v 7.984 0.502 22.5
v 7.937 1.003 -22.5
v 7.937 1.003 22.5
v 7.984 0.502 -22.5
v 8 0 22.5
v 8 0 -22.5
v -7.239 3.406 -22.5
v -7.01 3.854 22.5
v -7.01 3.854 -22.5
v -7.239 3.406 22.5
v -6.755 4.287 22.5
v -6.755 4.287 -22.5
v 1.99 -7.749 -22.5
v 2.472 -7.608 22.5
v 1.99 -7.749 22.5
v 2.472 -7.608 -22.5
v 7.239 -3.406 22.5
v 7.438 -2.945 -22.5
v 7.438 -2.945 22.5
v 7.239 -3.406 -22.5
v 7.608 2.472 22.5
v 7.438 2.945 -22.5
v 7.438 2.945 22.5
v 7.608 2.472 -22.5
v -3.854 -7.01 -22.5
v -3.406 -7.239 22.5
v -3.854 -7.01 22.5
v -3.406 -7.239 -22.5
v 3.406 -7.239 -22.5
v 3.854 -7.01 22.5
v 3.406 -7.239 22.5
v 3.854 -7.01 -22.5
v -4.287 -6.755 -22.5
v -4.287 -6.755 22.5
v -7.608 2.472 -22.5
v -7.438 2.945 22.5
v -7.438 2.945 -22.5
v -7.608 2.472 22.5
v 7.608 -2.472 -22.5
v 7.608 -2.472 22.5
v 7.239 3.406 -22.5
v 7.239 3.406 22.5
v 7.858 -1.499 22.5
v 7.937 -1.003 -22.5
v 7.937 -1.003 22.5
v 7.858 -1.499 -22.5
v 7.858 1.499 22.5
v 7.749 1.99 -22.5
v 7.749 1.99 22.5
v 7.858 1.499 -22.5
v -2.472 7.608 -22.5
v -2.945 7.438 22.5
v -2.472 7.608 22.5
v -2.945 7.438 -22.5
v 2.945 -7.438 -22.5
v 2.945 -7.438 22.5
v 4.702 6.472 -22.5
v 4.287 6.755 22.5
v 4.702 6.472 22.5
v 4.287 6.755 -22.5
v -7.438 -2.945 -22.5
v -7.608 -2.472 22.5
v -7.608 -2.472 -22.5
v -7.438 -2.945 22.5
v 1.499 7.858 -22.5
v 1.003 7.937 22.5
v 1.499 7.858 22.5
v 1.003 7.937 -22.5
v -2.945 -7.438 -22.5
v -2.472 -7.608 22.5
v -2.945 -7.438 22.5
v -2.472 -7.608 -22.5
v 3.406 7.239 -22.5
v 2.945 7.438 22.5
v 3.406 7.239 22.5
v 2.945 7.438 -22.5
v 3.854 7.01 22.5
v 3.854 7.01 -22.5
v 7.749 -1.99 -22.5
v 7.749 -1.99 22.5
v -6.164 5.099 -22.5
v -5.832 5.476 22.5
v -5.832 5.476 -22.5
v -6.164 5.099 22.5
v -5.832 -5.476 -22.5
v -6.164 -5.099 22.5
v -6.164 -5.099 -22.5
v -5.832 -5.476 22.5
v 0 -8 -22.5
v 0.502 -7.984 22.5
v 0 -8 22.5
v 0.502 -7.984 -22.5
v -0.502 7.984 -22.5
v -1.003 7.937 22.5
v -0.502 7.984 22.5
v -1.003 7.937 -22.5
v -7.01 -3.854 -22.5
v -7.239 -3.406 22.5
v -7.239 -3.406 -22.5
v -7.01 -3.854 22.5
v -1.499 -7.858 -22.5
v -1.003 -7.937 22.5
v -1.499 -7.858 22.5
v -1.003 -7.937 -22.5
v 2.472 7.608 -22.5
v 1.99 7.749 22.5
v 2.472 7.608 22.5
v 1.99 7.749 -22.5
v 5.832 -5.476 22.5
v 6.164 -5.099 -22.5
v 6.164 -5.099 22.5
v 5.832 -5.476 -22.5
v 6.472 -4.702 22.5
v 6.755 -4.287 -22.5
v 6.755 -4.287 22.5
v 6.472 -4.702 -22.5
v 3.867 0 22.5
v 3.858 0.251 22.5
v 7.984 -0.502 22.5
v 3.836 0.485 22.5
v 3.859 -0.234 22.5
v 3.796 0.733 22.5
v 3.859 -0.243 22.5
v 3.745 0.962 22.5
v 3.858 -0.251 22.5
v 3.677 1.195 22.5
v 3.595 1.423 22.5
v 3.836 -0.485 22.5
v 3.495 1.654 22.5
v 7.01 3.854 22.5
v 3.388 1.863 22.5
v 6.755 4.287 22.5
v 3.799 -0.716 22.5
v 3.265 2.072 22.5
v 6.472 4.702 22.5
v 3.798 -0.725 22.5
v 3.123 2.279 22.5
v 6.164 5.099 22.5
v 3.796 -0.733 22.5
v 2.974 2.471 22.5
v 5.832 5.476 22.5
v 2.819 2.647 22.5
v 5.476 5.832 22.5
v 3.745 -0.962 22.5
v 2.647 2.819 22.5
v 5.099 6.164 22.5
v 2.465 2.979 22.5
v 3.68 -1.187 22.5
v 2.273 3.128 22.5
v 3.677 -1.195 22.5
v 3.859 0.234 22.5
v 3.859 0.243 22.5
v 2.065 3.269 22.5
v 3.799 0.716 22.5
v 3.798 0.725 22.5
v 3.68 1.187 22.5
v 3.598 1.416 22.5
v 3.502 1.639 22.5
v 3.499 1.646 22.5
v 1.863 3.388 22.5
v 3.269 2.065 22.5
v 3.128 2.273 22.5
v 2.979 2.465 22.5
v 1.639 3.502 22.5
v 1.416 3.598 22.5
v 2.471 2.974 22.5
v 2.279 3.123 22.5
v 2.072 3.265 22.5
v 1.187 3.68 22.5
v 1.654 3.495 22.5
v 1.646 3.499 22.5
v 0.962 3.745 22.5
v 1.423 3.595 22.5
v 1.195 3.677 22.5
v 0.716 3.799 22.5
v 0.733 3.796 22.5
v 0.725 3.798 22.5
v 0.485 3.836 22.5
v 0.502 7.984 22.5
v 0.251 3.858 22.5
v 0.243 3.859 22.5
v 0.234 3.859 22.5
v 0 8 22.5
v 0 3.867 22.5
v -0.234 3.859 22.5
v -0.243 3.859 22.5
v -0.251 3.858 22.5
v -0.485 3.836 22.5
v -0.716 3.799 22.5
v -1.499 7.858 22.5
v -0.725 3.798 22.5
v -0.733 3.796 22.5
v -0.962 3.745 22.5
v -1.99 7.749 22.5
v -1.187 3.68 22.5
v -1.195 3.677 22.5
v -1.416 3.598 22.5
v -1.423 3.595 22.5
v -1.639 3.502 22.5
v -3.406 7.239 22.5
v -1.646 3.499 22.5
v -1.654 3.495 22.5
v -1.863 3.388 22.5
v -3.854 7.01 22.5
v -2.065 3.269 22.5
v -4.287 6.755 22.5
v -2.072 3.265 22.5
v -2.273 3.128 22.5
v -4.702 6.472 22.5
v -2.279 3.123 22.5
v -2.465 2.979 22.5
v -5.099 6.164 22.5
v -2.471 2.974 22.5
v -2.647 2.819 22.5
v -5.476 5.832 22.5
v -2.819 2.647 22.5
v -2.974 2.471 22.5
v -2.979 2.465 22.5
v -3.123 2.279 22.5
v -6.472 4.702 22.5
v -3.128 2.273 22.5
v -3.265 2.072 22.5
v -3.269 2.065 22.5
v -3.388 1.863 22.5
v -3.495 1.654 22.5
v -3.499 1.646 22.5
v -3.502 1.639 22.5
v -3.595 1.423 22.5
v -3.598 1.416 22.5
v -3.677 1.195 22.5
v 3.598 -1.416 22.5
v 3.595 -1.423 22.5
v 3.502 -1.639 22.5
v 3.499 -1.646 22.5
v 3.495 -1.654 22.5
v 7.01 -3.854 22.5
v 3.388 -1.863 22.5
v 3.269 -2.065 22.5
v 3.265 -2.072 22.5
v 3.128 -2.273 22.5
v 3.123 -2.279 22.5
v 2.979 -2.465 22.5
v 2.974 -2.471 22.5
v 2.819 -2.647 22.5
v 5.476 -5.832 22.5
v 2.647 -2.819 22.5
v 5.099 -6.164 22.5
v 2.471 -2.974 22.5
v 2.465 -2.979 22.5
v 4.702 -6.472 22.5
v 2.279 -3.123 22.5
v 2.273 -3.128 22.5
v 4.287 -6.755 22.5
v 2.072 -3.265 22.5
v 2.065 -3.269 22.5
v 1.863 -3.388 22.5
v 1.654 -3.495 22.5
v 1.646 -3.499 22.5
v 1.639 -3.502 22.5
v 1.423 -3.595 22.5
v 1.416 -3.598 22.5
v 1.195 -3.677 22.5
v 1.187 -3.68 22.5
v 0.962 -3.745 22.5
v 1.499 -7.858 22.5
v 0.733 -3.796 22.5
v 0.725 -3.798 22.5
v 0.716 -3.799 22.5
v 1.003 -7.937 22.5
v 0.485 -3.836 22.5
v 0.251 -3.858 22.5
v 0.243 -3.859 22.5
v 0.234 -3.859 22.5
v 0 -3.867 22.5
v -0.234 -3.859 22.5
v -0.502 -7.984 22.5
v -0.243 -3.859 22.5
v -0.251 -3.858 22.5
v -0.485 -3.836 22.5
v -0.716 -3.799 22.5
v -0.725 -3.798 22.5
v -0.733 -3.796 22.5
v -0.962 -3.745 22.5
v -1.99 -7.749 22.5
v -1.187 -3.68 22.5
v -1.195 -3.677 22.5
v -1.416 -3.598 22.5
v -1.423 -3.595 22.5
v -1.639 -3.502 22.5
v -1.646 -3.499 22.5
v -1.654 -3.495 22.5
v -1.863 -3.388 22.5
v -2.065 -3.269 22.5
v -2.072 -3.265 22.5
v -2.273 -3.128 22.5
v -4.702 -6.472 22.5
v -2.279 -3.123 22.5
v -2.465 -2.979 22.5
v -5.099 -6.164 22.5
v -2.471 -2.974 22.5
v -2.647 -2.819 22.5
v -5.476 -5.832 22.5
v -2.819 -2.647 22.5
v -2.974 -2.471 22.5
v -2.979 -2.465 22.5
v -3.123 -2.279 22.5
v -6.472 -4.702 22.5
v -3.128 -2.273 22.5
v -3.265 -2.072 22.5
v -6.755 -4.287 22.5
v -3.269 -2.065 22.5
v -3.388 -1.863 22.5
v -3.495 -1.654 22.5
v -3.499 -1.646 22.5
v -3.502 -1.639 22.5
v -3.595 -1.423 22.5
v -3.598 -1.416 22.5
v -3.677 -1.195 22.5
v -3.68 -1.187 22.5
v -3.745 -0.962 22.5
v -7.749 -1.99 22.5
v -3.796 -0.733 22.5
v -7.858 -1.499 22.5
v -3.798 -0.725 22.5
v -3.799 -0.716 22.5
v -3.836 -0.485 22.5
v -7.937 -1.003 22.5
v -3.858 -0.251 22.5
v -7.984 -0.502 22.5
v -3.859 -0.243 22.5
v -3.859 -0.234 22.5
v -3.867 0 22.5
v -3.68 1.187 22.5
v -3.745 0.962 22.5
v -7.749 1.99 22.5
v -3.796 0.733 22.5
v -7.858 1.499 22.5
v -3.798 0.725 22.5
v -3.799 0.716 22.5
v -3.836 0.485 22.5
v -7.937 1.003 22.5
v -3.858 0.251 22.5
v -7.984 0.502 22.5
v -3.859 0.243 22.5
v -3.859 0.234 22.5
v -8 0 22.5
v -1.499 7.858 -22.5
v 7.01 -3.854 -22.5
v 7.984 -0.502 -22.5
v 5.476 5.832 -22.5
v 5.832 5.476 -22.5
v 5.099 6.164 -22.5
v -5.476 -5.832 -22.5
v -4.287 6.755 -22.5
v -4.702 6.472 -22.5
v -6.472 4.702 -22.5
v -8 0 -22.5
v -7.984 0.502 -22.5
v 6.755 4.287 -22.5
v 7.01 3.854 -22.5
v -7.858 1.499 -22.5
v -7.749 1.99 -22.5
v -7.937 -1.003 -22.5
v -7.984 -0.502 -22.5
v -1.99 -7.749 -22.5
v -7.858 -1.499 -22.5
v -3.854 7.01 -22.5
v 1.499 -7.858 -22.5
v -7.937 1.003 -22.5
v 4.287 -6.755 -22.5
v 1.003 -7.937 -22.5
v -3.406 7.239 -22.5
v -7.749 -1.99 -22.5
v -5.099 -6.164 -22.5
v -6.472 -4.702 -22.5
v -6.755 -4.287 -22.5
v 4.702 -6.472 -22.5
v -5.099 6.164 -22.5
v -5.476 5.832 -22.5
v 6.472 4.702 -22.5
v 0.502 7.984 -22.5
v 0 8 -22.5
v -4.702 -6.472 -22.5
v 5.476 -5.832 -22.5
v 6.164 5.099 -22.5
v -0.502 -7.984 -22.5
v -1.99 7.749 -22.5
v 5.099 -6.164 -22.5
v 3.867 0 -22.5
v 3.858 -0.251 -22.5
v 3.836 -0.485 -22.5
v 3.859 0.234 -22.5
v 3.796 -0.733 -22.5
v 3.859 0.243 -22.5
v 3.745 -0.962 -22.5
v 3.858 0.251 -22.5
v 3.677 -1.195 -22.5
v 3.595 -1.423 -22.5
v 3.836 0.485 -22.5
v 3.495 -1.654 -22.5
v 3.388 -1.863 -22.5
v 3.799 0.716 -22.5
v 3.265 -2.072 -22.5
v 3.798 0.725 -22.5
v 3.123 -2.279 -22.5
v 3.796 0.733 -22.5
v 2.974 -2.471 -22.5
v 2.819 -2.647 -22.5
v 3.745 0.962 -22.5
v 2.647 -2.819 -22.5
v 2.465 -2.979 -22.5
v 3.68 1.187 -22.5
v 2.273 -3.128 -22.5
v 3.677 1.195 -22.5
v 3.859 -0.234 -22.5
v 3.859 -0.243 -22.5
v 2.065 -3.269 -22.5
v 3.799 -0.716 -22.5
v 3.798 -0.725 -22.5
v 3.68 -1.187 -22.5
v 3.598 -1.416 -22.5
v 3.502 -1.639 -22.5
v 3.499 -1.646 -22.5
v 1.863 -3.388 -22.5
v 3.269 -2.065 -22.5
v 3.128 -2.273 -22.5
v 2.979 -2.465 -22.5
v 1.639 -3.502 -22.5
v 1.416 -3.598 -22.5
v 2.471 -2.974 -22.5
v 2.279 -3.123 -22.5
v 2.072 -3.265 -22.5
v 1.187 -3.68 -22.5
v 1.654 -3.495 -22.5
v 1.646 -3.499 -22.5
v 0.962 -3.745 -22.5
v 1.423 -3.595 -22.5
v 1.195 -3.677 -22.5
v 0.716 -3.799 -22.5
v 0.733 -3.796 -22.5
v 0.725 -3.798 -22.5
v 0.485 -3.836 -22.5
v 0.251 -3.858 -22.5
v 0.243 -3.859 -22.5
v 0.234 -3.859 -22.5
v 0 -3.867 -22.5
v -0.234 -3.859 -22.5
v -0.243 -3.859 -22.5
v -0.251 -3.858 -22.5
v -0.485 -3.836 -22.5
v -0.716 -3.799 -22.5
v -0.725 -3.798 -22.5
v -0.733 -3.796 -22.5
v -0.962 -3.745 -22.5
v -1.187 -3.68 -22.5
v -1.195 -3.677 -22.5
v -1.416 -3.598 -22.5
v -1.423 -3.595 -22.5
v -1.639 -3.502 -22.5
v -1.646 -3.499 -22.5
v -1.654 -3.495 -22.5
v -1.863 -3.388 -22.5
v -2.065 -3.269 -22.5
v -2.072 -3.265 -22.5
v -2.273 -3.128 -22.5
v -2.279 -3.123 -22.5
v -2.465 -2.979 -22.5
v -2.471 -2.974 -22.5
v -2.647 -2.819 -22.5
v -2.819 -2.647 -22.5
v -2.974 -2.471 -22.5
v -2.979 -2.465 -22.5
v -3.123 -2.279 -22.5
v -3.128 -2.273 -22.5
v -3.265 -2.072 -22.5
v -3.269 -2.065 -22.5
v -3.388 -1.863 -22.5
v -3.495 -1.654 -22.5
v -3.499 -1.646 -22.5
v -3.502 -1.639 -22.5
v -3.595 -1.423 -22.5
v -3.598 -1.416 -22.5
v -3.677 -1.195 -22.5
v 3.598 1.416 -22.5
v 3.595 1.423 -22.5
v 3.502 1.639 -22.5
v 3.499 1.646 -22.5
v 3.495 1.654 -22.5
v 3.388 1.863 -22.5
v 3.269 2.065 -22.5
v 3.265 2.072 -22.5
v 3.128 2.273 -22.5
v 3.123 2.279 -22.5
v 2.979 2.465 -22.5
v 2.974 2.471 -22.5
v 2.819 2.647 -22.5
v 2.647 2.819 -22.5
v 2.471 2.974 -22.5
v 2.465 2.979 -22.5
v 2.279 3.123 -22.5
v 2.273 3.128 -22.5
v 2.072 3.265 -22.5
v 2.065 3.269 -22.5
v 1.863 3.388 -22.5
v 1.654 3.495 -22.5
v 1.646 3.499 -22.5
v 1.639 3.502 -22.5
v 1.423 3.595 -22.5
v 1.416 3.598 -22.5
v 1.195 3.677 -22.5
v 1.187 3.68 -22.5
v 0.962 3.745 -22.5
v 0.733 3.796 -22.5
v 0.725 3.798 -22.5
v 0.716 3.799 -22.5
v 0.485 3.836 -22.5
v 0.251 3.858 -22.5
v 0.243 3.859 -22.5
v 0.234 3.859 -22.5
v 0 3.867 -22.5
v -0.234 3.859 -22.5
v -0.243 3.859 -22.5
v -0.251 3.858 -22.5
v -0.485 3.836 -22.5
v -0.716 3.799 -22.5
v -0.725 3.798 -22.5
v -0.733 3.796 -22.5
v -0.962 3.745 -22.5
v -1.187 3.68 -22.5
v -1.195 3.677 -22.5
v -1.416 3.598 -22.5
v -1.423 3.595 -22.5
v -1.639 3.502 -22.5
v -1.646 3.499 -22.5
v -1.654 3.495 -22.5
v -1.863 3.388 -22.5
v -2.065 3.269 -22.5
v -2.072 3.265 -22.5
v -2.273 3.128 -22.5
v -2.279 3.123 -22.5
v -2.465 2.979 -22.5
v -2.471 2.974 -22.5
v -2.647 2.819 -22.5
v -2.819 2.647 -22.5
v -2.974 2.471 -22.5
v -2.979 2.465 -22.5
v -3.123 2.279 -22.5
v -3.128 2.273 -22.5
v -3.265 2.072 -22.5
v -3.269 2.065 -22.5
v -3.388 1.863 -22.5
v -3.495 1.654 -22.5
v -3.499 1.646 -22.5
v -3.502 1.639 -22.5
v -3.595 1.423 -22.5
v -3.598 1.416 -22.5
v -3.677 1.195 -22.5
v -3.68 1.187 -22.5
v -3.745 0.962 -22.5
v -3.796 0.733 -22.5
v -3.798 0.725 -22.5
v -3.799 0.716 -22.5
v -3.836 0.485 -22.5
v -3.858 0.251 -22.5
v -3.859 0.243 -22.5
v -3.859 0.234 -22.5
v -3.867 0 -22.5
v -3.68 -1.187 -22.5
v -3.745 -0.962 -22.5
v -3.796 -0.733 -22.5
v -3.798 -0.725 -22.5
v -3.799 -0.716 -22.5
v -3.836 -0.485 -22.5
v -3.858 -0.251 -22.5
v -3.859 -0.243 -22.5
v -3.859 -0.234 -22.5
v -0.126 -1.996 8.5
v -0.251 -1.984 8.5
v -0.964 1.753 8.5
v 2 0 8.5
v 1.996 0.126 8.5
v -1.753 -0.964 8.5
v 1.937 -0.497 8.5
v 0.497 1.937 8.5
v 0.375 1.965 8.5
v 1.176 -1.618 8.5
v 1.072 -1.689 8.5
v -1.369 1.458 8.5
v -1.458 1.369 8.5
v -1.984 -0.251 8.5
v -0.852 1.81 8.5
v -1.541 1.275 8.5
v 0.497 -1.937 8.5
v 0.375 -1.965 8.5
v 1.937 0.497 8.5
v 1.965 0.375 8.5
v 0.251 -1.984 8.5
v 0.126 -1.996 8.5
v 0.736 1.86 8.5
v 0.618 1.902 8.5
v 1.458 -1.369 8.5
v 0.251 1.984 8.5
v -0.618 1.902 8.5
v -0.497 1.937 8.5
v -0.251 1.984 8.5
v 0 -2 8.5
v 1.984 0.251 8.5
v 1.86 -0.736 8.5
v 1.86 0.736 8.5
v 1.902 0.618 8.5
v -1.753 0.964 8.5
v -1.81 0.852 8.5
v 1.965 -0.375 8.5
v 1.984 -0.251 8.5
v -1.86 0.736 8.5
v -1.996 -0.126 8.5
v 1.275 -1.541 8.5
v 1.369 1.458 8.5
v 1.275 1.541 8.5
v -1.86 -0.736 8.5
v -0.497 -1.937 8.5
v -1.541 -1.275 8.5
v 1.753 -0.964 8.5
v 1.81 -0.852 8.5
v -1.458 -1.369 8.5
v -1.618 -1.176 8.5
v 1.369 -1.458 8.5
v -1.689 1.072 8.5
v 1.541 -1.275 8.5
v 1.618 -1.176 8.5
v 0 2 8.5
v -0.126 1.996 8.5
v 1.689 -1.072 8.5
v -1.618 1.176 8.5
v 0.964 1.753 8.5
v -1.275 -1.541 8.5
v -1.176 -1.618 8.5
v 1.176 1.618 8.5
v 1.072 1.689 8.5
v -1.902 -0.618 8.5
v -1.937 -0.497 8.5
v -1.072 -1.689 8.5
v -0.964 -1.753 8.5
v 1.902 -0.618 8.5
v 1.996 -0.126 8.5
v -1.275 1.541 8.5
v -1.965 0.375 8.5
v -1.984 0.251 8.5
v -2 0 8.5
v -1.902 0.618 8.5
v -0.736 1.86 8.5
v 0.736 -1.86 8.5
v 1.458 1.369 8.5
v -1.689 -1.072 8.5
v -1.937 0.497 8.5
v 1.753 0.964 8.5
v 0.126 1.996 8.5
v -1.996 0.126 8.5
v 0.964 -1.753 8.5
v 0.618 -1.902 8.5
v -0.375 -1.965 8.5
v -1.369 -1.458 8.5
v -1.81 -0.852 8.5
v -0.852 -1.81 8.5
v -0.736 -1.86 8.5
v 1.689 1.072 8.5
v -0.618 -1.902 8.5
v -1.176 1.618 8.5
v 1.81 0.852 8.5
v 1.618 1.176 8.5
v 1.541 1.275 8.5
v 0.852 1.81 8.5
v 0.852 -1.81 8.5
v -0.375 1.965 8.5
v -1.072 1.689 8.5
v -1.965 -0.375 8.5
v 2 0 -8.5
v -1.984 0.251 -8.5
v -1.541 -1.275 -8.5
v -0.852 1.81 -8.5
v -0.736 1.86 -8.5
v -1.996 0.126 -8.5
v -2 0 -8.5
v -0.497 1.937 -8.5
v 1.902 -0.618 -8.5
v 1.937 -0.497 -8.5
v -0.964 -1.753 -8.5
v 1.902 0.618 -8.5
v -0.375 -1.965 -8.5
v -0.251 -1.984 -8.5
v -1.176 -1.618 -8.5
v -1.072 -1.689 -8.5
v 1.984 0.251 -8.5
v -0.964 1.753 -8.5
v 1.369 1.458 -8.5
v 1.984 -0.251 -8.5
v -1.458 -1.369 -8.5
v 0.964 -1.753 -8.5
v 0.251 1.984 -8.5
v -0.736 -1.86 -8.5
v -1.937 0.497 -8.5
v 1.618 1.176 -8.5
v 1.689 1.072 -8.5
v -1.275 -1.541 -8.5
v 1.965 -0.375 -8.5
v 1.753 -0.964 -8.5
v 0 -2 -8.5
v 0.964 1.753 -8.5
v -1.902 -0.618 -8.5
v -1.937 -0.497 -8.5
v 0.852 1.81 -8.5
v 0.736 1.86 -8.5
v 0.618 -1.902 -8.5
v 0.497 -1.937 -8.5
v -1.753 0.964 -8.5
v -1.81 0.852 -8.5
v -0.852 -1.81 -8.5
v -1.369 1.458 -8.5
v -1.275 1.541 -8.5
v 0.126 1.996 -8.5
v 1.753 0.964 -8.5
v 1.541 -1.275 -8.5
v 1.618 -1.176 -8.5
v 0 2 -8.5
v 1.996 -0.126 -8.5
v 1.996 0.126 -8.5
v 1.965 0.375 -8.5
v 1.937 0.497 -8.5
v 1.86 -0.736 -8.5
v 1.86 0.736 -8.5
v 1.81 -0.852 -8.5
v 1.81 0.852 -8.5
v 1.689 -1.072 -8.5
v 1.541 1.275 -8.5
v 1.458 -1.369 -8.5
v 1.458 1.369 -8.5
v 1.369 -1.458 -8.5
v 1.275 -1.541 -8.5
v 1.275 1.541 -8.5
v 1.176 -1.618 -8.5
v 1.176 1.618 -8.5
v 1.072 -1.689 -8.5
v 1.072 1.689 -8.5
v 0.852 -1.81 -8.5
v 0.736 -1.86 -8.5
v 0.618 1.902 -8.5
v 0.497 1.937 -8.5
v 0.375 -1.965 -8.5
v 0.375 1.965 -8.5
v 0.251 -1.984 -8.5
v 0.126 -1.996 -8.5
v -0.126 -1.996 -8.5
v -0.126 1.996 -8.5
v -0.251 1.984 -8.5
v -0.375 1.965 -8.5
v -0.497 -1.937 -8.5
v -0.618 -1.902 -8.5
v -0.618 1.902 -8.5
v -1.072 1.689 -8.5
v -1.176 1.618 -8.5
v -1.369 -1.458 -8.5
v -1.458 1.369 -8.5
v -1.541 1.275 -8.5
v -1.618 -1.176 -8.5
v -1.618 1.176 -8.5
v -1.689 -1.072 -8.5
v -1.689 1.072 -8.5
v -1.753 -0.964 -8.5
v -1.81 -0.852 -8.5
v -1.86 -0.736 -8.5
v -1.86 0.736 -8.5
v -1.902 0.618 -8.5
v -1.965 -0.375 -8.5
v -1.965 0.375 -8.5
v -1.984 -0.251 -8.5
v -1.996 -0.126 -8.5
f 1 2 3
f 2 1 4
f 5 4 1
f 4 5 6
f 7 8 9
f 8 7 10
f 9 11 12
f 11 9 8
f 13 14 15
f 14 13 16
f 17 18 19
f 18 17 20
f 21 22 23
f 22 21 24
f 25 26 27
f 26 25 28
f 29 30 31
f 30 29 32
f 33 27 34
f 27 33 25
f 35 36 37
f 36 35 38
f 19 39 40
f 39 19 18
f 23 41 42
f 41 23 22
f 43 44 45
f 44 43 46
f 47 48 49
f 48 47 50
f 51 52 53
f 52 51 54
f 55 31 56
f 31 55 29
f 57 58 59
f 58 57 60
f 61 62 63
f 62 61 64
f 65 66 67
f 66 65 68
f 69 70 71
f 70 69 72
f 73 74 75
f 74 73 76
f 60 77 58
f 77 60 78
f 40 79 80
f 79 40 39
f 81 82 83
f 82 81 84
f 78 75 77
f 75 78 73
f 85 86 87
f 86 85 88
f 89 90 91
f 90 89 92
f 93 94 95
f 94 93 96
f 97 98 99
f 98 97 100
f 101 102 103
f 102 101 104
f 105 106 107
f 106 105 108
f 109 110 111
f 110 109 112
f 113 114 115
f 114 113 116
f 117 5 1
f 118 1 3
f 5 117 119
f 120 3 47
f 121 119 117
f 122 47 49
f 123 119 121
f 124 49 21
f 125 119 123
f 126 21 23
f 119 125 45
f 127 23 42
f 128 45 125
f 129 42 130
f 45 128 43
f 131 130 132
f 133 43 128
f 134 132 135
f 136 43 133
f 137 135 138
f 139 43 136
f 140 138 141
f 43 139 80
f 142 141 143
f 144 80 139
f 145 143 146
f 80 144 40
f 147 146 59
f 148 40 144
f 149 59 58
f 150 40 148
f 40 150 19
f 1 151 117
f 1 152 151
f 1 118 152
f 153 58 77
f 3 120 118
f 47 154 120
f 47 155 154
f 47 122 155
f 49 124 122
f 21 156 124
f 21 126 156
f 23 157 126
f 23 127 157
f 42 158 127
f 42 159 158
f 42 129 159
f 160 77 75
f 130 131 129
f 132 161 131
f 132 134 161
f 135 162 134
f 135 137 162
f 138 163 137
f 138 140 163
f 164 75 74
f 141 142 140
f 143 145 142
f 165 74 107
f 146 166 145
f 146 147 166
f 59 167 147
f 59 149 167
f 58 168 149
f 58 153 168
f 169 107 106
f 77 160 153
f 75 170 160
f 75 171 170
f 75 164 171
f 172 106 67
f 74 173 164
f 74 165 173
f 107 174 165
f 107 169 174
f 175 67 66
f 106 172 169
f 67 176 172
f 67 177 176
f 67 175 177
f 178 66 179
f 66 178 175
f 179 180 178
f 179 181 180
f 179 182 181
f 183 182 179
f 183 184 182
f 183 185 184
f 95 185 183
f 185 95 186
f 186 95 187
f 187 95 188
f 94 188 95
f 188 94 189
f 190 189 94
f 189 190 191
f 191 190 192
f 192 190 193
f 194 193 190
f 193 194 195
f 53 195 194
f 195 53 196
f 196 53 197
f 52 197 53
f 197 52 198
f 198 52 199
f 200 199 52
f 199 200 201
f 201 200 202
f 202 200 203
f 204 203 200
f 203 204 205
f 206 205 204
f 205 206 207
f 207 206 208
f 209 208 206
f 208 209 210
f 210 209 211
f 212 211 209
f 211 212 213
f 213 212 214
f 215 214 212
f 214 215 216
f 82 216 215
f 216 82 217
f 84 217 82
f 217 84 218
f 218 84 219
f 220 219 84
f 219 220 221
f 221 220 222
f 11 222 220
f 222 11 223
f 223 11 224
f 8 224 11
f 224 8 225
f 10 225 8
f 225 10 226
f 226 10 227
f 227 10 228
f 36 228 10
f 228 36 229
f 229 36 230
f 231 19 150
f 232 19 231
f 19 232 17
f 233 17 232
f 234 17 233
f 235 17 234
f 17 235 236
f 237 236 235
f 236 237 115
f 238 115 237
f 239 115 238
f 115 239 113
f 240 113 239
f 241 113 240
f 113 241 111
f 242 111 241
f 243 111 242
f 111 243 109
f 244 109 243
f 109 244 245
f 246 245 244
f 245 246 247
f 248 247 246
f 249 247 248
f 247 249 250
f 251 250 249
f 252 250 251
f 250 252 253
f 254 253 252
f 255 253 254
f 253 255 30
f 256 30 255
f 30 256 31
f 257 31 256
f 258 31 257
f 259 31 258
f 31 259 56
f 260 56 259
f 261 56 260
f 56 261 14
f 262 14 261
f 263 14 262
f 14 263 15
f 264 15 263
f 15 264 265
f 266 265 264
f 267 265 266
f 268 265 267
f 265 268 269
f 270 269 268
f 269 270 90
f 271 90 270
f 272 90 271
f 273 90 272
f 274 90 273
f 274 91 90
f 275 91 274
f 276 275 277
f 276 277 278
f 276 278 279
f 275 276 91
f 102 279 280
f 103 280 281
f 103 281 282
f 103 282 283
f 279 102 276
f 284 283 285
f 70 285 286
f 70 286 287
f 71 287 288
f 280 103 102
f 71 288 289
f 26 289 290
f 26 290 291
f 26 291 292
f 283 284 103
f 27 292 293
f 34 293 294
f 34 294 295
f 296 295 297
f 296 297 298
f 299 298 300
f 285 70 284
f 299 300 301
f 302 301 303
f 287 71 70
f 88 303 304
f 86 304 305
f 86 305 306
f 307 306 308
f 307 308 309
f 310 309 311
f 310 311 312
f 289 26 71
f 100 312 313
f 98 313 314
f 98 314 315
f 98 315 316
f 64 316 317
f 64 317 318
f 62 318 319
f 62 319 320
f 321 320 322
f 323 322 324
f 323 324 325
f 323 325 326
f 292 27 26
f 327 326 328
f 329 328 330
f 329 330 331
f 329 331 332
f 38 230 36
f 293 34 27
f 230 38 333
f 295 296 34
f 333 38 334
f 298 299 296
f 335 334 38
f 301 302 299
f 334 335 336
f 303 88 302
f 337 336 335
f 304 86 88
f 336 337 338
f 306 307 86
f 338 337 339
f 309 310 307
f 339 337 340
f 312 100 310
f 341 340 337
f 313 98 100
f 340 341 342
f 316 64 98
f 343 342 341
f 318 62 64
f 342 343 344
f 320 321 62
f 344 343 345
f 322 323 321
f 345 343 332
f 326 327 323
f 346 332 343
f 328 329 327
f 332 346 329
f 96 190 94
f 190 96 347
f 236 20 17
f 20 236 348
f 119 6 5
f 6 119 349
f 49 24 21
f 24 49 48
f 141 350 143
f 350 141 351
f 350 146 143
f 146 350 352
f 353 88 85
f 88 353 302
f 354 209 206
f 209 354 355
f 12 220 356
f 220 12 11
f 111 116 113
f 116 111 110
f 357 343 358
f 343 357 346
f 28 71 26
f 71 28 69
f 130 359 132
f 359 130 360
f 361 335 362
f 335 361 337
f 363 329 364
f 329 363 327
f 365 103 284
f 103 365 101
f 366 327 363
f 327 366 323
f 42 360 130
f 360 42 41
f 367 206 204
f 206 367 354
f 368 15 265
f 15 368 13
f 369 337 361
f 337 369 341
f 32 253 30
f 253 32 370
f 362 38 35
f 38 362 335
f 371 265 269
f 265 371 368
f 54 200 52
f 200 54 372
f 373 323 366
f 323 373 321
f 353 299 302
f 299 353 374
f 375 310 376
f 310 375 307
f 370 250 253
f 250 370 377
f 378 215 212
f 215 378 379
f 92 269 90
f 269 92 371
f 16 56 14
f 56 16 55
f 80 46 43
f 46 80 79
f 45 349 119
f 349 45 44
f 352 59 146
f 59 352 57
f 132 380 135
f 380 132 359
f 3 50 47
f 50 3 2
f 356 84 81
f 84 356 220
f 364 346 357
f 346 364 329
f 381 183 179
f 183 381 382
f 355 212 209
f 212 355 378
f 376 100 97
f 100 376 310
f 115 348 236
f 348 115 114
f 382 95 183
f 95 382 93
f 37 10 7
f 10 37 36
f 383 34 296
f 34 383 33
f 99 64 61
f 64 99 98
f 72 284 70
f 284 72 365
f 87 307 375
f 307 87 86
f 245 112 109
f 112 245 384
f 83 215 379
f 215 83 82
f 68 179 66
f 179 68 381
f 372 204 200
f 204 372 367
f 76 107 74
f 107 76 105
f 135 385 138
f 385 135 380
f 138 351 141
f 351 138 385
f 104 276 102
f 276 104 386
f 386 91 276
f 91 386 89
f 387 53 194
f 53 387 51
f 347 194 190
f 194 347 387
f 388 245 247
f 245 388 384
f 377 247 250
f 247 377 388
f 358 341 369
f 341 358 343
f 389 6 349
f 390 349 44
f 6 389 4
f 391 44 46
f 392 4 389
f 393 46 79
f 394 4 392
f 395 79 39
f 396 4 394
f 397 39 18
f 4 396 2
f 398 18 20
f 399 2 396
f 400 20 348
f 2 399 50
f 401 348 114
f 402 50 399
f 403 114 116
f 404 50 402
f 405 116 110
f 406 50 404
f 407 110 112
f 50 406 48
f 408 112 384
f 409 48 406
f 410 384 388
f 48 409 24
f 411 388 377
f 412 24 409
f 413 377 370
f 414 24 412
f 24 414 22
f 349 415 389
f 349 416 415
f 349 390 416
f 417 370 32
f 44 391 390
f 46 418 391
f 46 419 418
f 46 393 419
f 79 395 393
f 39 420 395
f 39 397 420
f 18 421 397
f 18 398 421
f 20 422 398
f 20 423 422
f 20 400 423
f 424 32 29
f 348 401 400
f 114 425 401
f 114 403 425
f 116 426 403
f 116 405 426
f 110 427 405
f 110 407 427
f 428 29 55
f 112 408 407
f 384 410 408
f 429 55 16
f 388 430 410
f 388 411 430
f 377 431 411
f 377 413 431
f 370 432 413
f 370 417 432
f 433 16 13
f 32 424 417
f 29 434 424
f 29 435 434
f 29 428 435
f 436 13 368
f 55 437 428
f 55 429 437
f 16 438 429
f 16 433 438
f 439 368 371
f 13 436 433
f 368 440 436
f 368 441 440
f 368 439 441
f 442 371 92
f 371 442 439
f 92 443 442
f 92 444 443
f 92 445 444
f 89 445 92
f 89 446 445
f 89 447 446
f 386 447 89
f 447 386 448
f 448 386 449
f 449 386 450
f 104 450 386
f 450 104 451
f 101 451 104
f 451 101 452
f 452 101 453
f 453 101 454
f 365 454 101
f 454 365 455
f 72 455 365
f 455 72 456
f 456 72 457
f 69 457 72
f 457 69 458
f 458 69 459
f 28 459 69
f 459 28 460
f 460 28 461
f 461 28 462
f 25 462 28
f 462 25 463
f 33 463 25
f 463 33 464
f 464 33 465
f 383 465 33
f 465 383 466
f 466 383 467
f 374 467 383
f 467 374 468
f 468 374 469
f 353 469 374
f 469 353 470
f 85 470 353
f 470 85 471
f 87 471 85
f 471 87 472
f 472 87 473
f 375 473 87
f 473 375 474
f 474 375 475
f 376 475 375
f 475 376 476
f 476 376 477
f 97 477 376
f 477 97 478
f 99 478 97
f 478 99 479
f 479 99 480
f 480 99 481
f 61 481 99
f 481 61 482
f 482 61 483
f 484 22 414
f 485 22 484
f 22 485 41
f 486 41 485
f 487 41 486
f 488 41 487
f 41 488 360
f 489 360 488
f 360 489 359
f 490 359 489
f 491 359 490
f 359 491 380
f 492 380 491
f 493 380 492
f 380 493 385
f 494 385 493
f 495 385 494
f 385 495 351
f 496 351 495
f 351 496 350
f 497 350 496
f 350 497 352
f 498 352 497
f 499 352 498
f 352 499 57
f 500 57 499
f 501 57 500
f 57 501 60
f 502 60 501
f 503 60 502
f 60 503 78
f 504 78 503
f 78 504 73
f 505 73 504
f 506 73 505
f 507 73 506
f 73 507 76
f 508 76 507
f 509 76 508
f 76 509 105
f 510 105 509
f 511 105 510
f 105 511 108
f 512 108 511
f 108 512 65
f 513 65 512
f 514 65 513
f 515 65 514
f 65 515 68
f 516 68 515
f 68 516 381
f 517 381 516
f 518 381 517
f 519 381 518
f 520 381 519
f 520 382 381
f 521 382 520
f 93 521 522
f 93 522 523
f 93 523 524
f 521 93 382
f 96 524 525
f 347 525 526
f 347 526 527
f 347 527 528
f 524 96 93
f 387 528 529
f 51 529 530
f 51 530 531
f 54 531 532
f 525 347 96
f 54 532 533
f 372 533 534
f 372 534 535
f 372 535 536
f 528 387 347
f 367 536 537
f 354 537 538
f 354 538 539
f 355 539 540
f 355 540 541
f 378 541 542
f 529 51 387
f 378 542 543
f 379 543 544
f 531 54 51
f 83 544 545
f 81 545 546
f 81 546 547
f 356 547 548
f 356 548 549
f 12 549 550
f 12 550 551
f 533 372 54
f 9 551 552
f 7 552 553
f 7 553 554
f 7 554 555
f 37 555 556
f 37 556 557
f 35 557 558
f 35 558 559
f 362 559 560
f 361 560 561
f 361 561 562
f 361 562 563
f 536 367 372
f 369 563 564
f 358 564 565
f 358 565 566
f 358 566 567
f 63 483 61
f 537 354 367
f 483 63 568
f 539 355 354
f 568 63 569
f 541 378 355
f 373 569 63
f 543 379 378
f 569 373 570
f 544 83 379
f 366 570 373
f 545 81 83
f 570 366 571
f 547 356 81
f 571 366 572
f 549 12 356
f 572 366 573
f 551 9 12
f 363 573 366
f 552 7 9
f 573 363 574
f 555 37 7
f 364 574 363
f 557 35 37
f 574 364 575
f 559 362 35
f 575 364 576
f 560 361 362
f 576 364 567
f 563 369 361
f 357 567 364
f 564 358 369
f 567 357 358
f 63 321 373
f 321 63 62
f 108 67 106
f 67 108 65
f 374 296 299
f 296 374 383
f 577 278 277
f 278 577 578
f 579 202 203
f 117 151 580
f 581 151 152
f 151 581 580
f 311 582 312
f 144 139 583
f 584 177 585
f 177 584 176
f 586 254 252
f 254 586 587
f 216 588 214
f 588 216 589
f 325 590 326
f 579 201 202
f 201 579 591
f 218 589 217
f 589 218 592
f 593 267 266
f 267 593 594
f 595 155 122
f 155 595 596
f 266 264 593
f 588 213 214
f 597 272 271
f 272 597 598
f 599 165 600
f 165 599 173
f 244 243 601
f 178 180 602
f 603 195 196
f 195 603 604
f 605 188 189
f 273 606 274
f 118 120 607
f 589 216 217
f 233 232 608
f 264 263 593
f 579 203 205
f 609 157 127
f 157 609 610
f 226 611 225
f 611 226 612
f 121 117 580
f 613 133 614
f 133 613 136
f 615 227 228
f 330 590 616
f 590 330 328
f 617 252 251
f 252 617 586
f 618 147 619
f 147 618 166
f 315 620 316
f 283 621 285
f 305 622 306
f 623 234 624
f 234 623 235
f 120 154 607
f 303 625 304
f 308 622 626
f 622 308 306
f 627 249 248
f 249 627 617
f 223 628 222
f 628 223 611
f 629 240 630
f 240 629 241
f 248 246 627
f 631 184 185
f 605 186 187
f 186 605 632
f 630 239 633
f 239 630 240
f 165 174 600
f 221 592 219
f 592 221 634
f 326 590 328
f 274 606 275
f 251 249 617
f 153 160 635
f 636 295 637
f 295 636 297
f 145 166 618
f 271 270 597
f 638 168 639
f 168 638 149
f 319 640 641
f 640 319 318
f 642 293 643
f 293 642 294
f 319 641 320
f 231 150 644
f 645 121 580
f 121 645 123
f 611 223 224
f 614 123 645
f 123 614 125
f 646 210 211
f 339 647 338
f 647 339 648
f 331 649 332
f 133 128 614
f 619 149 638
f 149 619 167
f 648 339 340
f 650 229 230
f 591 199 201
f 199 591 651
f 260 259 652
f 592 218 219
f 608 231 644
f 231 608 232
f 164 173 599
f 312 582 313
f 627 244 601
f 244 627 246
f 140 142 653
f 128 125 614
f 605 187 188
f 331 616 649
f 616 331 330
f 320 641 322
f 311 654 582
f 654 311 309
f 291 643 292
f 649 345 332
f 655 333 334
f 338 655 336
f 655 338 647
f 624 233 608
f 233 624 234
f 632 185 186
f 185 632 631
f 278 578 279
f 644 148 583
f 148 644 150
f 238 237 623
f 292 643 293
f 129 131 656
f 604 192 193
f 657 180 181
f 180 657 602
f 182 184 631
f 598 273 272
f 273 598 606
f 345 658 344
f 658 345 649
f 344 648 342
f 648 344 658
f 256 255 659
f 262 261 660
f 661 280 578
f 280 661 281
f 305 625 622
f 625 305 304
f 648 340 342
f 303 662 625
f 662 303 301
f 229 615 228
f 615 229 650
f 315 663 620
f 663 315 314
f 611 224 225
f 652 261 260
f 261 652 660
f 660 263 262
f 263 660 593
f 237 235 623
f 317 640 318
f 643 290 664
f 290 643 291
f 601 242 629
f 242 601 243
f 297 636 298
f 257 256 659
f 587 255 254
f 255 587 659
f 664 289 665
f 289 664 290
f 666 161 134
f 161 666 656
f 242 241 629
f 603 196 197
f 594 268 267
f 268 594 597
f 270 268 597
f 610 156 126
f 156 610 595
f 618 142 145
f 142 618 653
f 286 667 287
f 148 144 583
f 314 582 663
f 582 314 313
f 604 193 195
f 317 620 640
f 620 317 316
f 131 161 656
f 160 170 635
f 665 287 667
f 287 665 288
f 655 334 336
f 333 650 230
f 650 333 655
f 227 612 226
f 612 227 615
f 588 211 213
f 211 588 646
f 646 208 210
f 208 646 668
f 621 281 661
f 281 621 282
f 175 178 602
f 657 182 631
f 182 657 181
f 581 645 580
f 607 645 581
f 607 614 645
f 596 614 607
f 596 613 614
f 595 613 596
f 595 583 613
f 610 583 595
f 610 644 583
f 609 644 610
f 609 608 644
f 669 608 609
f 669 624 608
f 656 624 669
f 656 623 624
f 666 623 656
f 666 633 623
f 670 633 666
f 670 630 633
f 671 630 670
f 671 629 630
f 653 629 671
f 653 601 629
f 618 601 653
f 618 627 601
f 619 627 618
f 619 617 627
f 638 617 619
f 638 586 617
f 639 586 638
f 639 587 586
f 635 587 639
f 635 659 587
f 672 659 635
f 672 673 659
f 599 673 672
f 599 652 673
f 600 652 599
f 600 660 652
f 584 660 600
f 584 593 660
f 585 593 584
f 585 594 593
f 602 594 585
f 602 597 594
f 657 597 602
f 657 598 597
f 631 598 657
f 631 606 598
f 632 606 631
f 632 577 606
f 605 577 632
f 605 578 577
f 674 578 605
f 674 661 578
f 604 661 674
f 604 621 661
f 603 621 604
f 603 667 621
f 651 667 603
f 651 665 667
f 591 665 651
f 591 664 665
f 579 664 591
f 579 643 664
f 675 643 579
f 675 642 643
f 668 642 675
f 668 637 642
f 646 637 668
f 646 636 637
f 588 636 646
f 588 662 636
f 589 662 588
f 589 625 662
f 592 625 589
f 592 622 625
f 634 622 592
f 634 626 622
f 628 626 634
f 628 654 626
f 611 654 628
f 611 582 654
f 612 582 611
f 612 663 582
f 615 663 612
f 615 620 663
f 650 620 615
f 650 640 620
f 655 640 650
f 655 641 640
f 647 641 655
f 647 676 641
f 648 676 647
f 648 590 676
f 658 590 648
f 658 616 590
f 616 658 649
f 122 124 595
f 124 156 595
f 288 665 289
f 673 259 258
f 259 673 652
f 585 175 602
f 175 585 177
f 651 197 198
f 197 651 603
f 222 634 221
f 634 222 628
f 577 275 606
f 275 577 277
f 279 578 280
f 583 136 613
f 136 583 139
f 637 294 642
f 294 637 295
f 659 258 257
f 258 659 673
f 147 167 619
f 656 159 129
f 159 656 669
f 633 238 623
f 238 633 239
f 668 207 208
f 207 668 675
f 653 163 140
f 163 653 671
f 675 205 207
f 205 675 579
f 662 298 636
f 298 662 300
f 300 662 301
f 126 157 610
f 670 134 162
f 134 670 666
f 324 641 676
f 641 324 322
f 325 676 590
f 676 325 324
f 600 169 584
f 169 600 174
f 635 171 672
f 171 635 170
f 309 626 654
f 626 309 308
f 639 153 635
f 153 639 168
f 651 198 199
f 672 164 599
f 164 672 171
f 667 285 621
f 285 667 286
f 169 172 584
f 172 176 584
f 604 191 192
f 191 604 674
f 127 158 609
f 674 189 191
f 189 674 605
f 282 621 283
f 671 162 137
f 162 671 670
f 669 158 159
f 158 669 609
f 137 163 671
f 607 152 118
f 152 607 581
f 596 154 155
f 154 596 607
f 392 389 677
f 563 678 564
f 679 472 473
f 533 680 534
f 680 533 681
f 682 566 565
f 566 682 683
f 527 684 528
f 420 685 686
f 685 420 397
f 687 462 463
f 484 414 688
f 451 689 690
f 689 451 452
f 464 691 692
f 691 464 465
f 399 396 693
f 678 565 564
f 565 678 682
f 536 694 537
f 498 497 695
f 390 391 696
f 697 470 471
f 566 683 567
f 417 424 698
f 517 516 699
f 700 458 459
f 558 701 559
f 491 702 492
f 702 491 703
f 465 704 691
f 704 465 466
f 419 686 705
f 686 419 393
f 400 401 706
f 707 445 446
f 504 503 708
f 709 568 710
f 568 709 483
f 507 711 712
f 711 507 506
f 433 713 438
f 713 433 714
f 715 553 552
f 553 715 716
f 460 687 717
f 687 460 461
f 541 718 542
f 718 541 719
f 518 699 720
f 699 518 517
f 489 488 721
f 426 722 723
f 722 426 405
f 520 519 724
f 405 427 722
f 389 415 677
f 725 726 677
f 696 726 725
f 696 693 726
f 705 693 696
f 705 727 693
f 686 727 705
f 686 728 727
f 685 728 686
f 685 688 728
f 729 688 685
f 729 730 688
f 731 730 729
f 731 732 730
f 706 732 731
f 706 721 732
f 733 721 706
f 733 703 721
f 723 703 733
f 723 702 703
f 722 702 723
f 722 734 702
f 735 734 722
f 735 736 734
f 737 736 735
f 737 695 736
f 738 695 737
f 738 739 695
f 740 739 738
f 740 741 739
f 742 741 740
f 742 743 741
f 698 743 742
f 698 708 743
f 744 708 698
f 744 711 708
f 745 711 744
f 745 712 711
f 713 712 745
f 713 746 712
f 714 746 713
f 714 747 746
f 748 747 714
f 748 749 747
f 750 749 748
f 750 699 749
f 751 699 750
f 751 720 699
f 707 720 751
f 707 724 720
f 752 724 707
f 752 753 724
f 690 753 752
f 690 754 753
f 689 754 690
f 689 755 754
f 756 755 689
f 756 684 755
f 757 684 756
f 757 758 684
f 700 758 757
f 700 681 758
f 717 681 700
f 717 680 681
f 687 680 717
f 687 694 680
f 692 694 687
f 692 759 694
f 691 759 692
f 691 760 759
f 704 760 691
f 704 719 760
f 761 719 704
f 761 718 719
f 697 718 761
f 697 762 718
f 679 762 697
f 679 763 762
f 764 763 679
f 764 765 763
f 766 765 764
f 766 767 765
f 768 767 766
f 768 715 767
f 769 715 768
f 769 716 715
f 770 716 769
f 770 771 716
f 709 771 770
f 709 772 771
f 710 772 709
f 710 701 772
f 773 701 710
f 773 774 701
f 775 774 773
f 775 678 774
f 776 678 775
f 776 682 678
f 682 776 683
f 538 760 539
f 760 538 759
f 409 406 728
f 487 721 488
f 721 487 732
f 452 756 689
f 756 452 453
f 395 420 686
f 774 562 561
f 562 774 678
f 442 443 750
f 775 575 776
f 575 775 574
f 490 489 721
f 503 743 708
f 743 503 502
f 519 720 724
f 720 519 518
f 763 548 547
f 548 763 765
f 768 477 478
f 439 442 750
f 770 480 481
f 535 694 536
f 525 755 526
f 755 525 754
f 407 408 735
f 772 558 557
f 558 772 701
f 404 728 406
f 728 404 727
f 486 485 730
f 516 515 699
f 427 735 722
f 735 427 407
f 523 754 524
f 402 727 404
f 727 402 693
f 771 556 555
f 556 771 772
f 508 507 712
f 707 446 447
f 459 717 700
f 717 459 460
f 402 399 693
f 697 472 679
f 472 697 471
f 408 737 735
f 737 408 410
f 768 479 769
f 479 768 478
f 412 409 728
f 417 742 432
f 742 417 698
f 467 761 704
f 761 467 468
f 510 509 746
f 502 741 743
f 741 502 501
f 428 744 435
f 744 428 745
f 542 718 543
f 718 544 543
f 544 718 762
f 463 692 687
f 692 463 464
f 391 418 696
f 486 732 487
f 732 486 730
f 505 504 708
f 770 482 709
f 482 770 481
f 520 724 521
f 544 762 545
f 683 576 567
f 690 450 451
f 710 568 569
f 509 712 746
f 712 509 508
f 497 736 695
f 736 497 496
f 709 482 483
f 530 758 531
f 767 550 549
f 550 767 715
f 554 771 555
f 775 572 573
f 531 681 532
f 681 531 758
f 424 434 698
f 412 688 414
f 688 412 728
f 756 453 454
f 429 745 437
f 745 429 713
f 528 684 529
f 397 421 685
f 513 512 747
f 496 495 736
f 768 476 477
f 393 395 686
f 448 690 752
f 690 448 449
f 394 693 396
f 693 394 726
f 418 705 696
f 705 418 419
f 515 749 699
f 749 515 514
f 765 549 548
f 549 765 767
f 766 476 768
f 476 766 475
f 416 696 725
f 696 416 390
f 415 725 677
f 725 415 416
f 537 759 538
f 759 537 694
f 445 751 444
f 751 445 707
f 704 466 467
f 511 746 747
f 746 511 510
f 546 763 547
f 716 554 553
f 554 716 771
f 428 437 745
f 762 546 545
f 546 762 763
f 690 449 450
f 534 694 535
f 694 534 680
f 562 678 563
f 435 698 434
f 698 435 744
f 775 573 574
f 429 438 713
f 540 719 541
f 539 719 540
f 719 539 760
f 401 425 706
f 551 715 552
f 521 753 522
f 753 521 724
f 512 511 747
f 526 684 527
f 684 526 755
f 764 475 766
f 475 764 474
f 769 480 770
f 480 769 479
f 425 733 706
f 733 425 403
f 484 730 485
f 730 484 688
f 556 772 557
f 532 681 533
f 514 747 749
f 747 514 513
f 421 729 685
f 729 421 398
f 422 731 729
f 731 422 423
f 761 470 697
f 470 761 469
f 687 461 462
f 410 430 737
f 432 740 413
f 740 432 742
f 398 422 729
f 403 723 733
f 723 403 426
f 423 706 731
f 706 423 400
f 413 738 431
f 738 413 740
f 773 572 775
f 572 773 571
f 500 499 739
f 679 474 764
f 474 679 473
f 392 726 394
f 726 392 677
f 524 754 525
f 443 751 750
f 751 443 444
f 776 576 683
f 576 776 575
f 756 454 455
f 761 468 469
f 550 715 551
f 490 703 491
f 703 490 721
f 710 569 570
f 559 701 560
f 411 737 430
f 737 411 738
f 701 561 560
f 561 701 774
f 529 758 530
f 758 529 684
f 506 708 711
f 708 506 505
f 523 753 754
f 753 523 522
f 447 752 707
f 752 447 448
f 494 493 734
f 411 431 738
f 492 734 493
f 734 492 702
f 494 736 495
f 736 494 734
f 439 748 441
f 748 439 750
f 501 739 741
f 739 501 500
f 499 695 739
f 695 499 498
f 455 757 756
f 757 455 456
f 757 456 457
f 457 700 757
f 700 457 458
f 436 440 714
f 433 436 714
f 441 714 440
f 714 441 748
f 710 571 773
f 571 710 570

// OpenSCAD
l=45;
r=8;
r1=4;
r2=2;

$fn=100;

difference(){
difference(){
cylinder(l,r,r,center=true);
translate([0,0,16])cylinder(15,r2,r1,center=true);
translate([0,0,-16])cylinder(15,r1,r2,center=true);
}
}
